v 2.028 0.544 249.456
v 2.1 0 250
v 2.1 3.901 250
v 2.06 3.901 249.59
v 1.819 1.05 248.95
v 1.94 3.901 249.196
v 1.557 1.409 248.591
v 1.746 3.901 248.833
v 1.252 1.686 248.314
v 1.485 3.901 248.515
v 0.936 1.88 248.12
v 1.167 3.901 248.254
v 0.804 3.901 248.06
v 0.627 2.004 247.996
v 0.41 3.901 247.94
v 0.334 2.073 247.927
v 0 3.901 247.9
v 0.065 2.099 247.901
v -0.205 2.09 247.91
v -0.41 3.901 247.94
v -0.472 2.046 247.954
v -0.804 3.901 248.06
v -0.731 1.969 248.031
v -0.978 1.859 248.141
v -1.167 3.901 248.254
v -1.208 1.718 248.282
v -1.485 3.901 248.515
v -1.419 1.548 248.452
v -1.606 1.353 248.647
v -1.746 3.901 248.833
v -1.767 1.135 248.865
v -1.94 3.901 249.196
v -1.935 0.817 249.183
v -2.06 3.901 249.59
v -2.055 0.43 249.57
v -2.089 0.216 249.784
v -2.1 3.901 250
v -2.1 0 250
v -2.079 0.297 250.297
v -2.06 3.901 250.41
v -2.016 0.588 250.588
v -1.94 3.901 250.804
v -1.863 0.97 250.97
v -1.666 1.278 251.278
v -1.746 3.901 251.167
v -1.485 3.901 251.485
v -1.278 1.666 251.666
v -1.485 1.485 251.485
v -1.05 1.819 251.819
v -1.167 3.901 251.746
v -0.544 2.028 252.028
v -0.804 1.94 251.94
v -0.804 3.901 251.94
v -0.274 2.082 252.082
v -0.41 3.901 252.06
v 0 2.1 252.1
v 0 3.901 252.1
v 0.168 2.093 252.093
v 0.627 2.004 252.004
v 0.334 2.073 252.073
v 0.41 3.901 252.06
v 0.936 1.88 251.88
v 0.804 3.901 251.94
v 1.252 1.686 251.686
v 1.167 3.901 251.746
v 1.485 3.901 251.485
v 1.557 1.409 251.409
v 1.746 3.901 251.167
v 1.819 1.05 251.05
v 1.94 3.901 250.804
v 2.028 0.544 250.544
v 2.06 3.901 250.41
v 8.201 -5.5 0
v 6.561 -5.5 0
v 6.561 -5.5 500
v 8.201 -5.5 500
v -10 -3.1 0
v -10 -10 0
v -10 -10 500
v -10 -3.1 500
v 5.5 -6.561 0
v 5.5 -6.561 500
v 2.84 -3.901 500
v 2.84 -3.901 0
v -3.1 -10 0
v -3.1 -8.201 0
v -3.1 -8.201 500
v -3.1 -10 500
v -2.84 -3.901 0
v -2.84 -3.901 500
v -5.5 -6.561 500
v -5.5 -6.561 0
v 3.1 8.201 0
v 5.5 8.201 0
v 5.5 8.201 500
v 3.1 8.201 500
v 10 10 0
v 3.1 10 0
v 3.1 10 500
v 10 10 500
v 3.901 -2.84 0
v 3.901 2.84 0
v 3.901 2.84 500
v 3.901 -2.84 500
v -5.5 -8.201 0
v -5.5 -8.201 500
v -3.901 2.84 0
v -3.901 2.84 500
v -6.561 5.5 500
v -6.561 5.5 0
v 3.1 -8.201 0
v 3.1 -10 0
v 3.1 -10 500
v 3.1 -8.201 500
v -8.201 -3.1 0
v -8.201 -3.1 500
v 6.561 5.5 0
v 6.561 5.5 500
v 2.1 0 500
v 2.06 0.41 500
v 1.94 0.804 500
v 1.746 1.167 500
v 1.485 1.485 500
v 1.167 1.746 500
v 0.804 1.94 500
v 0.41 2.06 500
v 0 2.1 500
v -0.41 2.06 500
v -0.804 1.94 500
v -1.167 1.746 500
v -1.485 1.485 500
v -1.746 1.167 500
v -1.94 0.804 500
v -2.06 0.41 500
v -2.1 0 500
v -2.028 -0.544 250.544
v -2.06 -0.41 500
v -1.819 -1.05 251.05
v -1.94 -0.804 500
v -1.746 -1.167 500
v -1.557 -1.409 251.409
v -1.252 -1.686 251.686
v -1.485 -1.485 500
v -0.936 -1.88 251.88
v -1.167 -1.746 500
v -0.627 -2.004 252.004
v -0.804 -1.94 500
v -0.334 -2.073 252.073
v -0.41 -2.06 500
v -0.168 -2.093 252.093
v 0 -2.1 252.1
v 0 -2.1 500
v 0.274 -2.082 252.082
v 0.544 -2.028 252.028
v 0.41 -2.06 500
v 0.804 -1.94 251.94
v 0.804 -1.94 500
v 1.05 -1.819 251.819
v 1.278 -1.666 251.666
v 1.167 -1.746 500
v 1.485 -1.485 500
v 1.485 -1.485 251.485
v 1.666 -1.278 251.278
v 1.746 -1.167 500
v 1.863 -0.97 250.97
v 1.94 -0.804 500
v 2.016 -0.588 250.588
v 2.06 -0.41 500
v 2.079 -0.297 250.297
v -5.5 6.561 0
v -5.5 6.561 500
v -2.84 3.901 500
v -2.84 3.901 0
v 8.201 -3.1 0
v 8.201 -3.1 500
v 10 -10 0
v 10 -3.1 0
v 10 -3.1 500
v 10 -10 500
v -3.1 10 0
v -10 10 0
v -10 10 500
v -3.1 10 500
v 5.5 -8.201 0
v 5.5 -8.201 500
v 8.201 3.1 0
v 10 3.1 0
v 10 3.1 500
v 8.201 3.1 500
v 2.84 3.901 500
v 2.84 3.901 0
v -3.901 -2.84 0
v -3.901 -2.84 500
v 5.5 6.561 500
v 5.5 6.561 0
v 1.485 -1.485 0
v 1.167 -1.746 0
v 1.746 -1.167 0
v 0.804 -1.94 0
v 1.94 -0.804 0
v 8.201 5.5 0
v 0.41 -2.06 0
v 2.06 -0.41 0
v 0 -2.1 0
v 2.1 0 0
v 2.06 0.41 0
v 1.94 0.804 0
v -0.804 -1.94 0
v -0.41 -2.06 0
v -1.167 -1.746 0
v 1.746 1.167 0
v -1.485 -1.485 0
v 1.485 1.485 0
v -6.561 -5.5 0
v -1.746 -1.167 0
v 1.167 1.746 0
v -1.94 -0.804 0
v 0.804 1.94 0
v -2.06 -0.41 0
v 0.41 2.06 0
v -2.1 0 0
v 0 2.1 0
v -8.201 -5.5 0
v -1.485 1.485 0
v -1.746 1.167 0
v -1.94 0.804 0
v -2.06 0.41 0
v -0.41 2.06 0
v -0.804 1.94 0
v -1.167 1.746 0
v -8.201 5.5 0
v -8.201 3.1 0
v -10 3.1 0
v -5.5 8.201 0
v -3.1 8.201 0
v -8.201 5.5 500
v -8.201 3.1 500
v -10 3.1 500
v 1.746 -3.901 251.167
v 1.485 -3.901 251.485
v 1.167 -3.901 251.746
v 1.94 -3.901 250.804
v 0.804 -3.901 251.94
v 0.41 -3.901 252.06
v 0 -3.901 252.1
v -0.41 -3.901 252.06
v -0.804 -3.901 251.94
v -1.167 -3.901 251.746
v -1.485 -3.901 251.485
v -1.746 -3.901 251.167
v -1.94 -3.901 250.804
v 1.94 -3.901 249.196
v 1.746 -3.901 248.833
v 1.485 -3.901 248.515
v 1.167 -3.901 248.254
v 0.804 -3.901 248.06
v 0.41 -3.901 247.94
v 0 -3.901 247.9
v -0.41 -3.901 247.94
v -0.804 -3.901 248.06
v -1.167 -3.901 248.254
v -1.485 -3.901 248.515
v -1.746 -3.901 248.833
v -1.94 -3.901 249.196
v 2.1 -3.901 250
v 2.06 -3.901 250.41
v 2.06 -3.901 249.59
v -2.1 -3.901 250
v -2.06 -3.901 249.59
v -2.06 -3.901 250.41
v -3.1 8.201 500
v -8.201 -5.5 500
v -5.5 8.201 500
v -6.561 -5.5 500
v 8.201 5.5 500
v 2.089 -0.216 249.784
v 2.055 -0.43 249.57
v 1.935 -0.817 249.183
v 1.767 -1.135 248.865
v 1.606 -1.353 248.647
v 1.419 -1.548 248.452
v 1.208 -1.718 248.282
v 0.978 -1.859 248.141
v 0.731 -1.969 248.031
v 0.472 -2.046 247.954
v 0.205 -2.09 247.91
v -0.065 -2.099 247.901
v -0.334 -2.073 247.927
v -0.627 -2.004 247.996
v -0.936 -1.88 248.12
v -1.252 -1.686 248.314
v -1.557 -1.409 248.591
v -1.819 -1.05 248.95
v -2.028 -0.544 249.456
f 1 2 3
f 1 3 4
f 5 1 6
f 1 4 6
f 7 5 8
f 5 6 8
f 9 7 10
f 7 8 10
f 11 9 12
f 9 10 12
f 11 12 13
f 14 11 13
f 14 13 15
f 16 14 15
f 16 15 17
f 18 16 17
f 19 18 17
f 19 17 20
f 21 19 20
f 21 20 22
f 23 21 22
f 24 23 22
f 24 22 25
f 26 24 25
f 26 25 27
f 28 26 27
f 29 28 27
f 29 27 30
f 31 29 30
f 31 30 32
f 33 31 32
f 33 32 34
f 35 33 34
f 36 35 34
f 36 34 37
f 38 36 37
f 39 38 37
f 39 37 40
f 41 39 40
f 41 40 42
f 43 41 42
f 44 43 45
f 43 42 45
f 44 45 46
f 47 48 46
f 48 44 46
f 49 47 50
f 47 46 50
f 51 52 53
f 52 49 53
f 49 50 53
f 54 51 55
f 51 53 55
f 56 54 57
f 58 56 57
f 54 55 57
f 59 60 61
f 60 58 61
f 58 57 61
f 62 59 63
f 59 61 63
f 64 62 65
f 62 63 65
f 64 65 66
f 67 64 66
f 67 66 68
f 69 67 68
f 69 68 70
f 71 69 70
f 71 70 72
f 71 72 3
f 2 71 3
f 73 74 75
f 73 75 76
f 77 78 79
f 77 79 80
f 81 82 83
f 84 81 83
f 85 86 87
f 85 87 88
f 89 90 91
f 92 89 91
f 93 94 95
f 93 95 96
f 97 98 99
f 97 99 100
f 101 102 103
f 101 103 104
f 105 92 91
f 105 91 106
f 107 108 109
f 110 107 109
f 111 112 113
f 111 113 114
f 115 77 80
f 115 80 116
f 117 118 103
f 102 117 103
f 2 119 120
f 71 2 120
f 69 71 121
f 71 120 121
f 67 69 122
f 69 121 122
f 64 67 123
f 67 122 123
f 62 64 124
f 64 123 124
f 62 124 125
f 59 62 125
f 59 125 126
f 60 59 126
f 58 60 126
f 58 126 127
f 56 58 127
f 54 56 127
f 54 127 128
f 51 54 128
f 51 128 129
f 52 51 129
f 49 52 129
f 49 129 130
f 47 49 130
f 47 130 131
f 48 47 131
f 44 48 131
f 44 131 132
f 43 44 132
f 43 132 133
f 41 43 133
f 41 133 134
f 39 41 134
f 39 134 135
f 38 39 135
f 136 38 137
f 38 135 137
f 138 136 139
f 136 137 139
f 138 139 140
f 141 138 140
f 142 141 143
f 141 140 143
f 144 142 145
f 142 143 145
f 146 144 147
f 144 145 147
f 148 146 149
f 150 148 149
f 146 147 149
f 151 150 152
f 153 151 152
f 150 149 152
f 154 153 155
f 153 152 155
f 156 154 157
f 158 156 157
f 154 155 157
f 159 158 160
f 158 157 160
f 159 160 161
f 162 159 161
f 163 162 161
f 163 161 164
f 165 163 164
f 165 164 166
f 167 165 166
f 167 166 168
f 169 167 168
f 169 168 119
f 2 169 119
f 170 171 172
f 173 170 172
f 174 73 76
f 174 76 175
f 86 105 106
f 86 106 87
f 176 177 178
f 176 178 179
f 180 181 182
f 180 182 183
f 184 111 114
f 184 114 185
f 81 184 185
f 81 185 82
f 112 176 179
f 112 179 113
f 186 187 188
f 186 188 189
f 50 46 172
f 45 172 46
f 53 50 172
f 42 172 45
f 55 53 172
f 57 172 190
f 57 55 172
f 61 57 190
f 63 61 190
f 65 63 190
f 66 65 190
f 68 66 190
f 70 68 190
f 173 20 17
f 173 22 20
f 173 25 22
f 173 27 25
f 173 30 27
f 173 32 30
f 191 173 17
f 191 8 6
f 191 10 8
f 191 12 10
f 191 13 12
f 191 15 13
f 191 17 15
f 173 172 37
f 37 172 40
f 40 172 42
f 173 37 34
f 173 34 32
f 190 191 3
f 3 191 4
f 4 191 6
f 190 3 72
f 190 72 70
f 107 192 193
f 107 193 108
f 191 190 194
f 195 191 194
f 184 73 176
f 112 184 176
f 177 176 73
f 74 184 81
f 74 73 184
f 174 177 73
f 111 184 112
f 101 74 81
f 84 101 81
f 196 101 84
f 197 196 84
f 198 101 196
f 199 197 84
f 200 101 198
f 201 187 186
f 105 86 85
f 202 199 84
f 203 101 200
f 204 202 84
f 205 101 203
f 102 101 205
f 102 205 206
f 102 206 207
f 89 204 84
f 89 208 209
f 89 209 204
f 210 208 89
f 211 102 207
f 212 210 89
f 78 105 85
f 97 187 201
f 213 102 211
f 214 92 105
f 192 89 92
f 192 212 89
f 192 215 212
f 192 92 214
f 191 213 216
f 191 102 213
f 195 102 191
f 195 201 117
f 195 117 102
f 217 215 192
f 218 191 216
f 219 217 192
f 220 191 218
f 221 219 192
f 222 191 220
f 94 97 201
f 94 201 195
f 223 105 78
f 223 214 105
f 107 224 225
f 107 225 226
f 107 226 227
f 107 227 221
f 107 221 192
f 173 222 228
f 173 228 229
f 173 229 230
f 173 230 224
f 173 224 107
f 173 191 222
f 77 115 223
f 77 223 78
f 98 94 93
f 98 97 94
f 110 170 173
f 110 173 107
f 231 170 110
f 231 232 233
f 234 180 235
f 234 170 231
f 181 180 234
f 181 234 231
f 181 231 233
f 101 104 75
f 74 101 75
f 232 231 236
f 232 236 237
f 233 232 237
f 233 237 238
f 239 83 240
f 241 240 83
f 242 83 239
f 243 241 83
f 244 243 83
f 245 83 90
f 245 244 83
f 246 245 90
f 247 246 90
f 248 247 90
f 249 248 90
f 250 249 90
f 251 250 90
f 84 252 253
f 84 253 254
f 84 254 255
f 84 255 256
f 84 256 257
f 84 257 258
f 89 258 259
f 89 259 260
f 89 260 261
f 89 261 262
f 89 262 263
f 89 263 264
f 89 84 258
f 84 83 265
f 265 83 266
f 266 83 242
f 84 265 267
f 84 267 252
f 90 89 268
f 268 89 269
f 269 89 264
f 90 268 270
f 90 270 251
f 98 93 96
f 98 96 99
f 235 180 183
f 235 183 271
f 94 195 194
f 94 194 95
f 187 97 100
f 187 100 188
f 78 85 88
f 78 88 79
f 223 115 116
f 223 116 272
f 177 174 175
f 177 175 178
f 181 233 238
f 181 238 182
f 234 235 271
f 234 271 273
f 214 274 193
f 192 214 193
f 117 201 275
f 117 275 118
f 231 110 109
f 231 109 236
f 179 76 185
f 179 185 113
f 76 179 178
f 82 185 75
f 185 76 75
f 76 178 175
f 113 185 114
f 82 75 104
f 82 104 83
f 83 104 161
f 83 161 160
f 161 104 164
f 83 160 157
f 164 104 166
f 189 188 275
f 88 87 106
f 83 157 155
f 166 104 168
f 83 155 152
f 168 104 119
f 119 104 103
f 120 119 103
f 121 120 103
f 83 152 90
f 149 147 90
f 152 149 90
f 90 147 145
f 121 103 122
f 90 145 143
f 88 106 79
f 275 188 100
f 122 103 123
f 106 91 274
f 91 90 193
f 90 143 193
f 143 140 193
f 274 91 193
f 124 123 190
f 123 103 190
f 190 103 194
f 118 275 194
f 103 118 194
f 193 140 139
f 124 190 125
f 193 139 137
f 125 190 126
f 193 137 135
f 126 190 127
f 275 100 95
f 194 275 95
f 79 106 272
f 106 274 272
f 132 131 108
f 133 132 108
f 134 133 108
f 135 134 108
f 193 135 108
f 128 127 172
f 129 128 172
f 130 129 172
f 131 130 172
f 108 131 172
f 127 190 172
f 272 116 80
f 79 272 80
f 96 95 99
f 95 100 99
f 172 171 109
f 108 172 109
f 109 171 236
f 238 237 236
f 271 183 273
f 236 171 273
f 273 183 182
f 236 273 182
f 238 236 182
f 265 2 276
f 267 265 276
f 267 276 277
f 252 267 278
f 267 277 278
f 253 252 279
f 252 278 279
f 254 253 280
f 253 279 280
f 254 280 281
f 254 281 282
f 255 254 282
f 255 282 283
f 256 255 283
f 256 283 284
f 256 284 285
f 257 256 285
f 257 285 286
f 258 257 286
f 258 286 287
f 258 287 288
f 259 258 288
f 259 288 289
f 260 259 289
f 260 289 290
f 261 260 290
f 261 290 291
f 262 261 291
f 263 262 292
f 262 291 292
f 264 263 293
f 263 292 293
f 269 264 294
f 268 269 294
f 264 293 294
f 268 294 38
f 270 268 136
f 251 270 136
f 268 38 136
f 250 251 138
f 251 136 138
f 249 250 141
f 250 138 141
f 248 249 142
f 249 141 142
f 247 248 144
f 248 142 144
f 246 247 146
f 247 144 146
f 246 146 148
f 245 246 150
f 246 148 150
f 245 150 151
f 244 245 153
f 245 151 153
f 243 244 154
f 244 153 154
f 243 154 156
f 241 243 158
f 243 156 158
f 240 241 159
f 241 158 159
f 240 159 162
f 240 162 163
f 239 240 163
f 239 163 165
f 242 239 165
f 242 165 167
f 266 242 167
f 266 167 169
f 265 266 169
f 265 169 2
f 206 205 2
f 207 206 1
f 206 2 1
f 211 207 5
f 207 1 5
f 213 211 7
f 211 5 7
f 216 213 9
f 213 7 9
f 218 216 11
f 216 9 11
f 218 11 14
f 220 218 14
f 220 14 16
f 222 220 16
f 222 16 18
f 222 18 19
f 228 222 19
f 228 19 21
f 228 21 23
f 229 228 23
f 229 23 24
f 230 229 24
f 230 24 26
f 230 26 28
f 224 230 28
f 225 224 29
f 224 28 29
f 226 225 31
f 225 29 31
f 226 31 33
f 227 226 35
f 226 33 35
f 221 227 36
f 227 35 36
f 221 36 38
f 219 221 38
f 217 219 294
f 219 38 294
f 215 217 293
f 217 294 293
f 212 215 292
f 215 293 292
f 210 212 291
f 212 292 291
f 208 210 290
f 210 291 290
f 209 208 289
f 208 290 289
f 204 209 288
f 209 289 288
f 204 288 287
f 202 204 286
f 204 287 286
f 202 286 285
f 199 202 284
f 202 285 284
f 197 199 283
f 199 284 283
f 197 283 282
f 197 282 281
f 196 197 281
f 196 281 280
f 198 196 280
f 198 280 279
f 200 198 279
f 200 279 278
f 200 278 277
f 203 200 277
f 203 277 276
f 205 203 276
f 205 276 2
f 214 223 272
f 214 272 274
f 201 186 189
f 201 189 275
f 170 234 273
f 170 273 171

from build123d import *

# Parameters (mm, degrees)
BOSS_EXTRUDE1_DEPTH = 500
SKETCH2_R           = 2.1
CUT_EXTRUDE1_DEPTH  = 501
SKETCH3_R           = 2.1
CUT_EXTRUDE2_DEPTH  = 14.900660172


with BuildPart() as part:
    # Sketch1 → Boss-Extrude1 (new body)
    with BuildSketch(Plane.XY):
        Polygon((-3.1, 10), (-3.1, 8.200660172), (-5.5, 8.200660172), (-5.5, 6.560660172), (-2.84, 3.900660172), (2.84, 3.900660172), (5.5, 6.560660172), (5.5, 8.200660172), (3.1, 8.200660172), (3.1, 10), (10, 10), (10, 3.1), (8.200660172, 3.1), (8.200660172, 5.5), (6.560660172, 5.5), (3.900660172, 2.84), (3.900660172, -2.84), (6.560660172, -5.5), (8.200660172, -5.5), (8.200660172, -3.1), (10, -3.1), (10, -10), (3.1, -10), (3.1, -8.200660172), (5.5, -8.200660172), (5.5, -6.560660172), (2.84, -3.900660172), (-2.84, -3.900660172), (-5.5, -6.560660172), (-5.5, -8.200660172), (-3.1, -8.200660172), (-3.1, -10), (-10, -10), (-10, -3.1), (-8.200660172, -3.1), (-8.200660172, -5.5), (-6.560660172, -5.5), (-3.900660172, -2.84), (-3.900660172, 2.84), (-6.560660172, 5.5), (-8.200660172, 5.5), (-8.200660172, 3.1), (-10, 3.1), (-10, 10), align=None)
    extrude(amount=BOSS_EXTRUDE1_DEPTH)

    # Sketch2 → Cut-Extrude1 (cut, through all)
    with BuildSketch(Plane.XY.offset(500)):
        Circle(SKETCH2_R)
    extrude(amount=-CUT_EXTRUDE1_DEPTH, mode=Mode.SUBTRACT)

    # Sketch3 → Cut-Extrude2 (cut, through all)
    with BuildSketch(Plane(origin=(0, 3.900660172, 0), x_dir=(1, 0, 0), z_dir=(0, 1, 0))):
        with Locations((0, -250)):
            Circle(SKETCH3_R)
    extrude(amount=-CUT_EXTRUDE2_DEPTH, mode=Mode.SUBTRACT)


solid = part.part
